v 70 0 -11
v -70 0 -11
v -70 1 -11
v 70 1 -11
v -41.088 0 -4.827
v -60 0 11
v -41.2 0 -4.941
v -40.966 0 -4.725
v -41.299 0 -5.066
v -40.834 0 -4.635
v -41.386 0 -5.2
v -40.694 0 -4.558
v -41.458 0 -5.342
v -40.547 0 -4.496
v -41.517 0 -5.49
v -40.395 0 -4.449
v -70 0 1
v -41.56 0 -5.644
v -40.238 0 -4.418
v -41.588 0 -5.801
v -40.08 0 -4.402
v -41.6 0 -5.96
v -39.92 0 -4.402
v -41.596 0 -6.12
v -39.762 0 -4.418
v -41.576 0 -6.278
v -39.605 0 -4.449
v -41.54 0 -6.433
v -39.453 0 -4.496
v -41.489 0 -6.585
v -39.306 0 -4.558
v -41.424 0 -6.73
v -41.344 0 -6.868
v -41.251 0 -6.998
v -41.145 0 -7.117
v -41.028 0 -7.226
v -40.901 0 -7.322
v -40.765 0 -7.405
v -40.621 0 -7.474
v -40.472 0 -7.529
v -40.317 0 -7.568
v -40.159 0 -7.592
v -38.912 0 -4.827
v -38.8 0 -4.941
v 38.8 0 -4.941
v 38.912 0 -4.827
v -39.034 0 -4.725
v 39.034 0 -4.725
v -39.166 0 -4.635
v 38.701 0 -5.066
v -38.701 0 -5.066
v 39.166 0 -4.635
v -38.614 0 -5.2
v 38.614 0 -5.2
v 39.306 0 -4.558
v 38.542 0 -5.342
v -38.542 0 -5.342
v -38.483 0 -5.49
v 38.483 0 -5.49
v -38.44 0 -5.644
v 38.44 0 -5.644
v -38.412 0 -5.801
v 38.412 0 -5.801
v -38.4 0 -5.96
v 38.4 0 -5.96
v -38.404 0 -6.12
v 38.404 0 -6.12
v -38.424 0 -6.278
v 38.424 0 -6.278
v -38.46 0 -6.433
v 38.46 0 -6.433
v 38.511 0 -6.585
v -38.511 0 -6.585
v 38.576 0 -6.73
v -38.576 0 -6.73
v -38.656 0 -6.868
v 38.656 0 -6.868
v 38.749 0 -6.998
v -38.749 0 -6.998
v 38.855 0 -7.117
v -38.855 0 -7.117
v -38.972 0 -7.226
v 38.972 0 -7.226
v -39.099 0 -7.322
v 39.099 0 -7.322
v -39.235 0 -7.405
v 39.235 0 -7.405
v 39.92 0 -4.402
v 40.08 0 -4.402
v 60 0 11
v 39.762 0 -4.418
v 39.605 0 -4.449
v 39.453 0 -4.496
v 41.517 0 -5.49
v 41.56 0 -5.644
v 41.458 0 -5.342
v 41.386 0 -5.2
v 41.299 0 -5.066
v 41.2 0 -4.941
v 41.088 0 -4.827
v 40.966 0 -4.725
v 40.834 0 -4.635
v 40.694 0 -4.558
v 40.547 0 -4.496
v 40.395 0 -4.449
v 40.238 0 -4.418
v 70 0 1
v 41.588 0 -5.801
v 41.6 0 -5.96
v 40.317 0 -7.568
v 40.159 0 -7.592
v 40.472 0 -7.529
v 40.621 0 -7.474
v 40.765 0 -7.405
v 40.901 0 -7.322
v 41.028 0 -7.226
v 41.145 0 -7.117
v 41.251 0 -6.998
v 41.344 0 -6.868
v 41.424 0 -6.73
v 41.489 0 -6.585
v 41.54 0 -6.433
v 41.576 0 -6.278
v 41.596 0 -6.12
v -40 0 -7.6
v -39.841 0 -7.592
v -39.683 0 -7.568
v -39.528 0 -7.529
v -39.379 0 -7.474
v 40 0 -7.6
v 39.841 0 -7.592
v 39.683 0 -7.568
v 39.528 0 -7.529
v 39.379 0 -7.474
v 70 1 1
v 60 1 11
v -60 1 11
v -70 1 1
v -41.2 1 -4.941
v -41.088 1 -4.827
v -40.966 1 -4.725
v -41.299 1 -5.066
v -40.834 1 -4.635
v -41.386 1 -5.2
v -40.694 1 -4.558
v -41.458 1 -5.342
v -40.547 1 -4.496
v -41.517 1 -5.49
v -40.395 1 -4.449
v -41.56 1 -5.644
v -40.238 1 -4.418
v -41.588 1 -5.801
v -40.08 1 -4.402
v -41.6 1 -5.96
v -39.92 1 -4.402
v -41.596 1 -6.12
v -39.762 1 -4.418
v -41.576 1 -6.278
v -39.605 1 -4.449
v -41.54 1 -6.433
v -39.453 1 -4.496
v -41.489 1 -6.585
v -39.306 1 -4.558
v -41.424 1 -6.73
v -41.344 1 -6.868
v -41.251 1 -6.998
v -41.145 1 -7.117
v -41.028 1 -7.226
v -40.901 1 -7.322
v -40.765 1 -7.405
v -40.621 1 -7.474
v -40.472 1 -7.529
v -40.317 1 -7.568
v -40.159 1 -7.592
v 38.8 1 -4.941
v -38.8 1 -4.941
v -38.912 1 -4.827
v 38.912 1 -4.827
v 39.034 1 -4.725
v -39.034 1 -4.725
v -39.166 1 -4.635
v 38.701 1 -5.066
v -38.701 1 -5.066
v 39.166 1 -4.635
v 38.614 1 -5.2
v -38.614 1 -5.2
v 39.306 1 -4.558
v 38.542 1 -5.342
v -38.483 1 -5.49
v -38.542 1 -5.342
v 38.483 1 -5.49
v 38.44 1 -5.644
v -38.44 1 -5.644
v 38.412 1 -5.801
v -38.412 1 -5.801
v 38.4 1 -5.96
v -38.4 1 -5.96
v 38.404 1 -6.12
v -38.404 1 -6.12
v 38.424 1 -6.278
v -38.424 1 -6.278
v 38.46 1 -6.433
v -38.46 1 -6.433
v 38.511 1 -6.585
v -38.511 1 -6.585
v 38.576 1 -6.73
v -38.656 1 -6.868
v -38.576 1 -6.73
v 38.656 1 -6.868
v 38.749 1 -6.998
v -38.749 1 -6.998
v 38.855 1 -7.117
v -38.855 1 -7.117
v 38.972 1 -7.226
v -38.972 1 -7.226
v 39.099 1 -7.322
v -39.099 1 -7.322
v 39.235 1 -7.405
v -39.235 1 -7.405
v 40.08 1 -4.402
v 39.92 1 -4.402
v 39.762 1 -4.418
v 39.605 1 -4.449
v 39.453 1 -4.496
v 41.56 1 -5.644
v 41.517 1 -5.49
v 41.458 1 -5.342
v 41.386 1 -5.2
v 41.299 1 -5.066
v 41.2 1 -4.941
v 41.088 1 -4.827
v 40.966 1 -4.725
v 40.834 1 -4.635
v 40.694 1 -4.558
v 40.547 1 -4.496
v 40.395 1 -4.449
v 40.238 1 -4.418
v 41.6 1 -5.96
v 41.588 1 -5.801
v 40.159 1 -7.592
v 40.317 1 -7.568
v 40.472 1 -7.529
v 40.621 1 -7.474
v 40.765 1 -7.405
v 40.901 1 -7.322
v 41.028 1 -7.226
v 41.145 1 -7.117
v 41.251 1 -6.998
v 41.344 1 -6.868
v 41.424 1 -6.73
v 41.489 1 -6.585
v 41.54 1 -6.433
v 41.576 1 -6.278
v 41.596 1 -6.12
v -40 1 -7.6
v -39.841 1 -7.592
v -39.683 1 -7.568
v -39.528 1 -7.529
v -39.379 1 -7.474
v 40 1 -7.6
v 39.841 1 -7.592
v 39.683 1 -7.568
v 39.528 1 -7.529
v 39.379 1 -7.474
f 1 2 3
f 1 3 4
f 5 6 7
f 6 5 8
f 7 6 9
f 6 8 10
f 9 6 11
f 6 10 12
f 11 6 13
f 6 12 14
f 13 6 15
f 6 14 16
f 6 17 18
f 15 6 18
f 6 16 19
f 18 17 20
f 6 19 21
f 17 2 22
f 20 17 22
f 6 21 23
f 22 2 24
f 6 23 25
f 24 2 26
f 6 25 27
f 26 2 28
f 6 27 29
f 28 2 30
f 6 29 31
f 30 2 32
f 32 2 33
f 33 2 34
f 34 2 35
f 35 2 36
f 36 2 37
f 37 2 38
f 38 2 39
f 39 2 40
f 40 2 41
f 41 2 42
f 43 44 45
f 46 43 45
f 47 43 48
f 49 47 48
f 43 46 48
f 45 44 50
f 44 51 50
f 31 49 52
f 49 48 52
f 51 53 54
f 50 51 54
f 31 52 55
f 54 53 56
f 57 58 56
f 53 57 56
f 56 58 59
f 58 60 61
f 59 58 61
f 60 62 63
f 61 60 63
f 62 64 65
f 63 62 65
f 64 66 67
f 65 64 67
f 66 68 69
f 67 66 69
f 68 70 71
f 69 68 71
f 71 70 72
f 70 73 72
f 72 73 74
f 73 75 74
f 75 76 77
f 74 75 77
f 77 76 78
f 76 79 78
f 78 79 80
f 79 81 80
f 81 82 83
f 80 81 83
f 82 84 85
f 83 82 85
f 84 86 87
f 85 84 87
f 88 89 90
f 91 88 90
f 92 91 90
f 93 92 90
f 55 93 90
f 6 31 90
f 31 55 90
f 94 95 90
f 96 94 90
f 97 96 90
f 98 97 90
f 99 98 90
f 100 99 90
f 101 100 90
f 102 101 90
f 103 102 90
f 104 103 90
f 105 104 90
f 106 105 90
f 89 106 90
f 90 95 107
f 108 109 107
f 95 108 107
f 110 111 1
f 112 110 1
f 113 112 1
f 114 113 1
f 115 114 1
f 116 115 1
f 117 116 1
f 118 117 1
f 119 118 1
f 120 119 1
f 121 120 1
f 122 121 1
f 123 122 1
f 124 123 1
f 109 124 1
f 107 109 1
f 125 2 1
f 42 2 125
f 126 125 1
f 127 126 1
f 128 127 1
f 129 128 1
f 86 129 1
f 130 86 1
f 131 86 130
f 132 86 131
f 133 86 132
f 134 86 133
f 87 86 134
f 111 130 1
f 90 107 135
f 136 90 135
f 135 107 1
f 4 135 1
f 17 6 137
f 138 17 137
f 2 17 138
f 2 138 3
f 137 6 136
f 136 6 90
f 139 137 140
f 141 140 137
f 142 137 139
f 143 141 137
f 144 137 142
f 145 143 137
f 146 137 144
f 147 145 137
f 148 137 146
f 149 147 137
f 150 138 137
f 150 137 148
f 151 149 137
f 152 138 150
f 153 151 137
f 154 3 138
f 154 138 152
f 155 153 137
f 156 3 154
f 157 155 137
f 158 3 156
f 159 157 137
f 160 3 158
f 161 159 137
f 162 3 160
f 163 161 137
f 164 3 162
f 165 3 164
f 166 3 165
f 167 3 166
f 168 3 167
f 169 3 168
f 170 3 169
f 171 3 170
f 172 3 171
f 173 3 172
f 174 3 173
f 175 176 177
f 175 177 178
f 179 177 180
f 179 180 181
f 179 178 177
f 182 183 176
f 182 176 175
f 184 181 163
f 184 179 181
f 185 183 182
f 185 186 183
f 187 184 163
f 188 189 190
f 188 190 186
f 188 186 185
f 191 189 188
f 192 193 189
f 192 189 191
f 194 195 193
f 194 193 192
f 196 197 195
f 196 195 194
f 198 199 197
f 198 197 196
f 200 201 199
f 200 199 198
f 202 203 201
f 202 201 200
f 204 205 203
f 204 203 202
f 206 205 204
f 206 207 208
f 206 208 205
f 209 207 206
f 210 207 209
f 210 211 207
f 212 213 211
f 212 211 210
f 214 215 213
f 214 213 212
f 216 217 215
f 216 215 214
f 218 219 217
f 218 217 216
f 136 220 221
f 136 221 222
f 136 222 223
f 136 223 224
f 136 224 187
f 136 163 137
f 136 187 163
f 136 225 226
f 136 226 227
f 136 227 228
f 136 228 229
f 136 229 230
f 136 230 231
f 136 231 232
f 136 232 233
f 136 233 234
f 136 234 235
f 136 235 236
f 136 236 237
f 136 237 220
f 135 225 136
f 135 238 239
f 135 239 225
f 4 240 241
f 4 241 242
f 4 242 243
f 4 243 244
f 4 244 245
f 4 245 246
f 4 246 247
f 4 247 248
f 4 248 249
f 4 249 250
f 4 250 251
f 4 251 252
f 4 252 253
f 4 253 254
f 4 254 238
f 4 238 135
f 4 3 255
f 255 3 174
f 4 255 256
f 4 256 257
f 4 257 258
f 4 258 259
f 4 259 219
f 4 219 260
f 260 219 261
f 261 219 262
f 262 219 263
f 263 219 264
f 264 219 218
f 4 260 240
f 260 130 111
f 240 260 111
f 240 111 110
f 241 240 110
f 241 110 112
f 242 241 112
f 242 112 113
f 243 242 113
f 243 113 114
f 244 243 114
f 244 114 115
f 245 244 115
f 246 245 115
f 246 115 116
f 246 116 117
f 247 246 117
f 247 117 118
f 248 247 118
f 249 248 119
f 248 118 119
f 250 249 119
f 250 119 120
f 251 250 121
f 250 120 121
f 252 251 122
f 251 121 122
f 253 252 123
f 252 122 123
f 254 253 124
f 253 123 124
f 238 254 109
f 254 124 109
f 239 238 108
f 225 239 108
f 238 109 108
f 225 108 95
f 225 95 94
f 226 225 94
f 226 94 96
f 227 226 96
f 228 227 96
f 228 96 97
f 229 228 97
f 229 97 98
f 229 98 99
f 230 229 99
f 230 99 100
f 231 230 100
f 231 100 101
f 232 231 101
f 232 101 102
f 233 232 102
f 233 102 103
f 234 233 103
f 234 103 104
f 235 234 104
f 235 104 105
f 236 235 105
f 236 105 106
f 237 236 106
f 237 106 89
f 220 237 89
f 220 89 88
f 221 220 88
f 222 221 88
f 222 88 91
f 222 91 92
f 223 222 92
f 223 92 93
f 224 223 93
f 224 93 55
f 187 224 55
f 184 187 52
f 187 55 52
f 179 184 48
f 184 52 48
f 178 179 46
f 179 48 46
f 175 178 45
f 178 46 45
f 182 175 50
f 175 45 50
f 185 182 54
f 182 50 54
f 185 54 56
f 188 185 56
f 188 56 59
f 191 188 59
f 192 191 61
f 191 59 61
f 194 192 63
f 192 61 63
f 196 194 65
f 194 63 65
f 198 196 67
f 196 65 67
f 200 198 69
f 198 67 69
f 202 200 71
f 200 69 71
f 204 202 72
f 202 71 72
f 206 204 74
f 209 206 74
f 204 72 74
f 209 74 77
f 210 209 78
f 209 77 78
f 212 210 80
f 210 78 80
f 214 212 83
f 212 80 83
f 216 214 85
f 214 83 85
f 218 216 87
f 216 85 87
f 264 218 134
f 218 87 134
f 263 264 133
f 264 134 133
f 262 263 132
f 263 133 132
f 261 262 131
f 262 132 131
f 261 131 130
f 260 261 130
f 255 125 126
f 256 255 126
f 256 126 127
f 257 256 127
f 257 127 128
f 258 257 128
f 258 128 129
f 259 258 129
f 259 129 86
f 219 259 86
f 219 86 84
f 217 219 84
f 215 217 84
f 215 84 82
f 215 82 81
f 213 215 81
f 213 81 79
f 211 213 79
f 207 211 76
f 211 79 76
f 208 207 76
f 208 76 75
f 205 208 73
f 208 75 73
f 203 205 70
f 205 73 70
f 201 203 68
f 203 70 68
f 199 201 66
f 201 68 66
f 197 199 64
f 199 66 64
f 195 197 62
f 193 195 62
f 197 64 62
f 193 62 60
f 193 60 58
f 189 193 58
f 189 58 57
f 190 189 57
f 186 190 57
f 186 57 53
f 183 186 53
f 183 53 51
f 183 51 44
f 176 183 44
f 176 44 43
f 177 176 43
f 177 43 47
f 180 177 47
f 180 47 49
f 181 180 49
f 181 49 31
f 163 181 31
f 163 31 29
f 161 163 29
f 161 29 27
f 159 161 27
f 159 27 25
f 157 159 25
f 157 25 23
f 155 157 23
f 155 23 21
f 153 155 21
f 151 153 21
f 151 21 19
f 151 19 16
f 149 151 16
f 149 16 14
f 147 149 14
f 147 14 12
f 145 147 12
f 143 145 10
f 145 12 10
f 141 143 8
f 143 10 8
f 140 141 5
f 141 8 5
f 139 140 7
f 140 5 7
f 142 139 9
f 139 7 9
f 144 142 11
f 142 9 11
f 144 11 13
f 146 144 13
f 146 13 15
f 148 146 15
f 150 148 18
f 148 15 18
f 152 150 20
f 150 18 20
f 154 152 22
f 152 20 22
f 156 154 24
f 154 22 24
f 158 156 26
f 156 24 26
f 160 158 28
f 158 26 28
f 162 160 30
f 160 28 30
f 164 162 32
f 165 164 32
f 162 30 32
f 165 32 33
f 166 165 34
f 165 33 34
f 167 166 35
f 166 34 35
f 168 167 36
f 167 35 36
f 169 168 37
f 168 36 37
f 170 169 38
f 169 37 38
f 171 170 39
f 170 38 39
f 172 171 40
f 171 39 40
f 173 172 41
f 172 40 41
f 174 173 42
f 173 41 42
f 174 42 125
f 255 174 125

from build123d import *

# Parameters (mm, degrees)
SKETCH_1_W          = 140
SKETCH_1_H          = 22
EXTRUDE_1_DEPTH     = 1
SKETCH_2_R          = 1.6
CUT_EXTRUDE_1_DEPTH = 10
CHAMFER_1_SIZE      = 10


with BuildPart() as part:
    # 草图1 → 凸台-拉伸1 (new body)
    with BuildSketch(Plane(origin=(0, 0, 0), x_dir=(1, 0, 0), z_dir=(0, 1, 0))):
        Rectangle(SKETCH_1_W, SKETCH_1_H)
    extrude(amount=EXTRUDE_1_DEPTH)

    # 草图2 → 切除-拉伸1 (cut)
    with BuildSketch(Plane.XZ):
        with Locations(Location((40, -6, 0), (0, 0, 270))):
            Circle(SKETCH_2_R)
        with Locations(Location((-40, -6, 0), (0, 0, 270))):
            Circle(SKETCH_2_R)
    extrude(amount=-CUT_EXTRUDE_1_DEPTH, mode=Mode.SUBTRACT)

    # 倒角1
    chamfer_1_edges = [part.edges().sort_by_distance(p)[0] for p in [
        (70, 0.5, 11),
        (-70, 0.5, 11),
    ]]
    chamfer(chamfer_1_edges, length=CHAMFER_1_SIZE)


solid = part.part
